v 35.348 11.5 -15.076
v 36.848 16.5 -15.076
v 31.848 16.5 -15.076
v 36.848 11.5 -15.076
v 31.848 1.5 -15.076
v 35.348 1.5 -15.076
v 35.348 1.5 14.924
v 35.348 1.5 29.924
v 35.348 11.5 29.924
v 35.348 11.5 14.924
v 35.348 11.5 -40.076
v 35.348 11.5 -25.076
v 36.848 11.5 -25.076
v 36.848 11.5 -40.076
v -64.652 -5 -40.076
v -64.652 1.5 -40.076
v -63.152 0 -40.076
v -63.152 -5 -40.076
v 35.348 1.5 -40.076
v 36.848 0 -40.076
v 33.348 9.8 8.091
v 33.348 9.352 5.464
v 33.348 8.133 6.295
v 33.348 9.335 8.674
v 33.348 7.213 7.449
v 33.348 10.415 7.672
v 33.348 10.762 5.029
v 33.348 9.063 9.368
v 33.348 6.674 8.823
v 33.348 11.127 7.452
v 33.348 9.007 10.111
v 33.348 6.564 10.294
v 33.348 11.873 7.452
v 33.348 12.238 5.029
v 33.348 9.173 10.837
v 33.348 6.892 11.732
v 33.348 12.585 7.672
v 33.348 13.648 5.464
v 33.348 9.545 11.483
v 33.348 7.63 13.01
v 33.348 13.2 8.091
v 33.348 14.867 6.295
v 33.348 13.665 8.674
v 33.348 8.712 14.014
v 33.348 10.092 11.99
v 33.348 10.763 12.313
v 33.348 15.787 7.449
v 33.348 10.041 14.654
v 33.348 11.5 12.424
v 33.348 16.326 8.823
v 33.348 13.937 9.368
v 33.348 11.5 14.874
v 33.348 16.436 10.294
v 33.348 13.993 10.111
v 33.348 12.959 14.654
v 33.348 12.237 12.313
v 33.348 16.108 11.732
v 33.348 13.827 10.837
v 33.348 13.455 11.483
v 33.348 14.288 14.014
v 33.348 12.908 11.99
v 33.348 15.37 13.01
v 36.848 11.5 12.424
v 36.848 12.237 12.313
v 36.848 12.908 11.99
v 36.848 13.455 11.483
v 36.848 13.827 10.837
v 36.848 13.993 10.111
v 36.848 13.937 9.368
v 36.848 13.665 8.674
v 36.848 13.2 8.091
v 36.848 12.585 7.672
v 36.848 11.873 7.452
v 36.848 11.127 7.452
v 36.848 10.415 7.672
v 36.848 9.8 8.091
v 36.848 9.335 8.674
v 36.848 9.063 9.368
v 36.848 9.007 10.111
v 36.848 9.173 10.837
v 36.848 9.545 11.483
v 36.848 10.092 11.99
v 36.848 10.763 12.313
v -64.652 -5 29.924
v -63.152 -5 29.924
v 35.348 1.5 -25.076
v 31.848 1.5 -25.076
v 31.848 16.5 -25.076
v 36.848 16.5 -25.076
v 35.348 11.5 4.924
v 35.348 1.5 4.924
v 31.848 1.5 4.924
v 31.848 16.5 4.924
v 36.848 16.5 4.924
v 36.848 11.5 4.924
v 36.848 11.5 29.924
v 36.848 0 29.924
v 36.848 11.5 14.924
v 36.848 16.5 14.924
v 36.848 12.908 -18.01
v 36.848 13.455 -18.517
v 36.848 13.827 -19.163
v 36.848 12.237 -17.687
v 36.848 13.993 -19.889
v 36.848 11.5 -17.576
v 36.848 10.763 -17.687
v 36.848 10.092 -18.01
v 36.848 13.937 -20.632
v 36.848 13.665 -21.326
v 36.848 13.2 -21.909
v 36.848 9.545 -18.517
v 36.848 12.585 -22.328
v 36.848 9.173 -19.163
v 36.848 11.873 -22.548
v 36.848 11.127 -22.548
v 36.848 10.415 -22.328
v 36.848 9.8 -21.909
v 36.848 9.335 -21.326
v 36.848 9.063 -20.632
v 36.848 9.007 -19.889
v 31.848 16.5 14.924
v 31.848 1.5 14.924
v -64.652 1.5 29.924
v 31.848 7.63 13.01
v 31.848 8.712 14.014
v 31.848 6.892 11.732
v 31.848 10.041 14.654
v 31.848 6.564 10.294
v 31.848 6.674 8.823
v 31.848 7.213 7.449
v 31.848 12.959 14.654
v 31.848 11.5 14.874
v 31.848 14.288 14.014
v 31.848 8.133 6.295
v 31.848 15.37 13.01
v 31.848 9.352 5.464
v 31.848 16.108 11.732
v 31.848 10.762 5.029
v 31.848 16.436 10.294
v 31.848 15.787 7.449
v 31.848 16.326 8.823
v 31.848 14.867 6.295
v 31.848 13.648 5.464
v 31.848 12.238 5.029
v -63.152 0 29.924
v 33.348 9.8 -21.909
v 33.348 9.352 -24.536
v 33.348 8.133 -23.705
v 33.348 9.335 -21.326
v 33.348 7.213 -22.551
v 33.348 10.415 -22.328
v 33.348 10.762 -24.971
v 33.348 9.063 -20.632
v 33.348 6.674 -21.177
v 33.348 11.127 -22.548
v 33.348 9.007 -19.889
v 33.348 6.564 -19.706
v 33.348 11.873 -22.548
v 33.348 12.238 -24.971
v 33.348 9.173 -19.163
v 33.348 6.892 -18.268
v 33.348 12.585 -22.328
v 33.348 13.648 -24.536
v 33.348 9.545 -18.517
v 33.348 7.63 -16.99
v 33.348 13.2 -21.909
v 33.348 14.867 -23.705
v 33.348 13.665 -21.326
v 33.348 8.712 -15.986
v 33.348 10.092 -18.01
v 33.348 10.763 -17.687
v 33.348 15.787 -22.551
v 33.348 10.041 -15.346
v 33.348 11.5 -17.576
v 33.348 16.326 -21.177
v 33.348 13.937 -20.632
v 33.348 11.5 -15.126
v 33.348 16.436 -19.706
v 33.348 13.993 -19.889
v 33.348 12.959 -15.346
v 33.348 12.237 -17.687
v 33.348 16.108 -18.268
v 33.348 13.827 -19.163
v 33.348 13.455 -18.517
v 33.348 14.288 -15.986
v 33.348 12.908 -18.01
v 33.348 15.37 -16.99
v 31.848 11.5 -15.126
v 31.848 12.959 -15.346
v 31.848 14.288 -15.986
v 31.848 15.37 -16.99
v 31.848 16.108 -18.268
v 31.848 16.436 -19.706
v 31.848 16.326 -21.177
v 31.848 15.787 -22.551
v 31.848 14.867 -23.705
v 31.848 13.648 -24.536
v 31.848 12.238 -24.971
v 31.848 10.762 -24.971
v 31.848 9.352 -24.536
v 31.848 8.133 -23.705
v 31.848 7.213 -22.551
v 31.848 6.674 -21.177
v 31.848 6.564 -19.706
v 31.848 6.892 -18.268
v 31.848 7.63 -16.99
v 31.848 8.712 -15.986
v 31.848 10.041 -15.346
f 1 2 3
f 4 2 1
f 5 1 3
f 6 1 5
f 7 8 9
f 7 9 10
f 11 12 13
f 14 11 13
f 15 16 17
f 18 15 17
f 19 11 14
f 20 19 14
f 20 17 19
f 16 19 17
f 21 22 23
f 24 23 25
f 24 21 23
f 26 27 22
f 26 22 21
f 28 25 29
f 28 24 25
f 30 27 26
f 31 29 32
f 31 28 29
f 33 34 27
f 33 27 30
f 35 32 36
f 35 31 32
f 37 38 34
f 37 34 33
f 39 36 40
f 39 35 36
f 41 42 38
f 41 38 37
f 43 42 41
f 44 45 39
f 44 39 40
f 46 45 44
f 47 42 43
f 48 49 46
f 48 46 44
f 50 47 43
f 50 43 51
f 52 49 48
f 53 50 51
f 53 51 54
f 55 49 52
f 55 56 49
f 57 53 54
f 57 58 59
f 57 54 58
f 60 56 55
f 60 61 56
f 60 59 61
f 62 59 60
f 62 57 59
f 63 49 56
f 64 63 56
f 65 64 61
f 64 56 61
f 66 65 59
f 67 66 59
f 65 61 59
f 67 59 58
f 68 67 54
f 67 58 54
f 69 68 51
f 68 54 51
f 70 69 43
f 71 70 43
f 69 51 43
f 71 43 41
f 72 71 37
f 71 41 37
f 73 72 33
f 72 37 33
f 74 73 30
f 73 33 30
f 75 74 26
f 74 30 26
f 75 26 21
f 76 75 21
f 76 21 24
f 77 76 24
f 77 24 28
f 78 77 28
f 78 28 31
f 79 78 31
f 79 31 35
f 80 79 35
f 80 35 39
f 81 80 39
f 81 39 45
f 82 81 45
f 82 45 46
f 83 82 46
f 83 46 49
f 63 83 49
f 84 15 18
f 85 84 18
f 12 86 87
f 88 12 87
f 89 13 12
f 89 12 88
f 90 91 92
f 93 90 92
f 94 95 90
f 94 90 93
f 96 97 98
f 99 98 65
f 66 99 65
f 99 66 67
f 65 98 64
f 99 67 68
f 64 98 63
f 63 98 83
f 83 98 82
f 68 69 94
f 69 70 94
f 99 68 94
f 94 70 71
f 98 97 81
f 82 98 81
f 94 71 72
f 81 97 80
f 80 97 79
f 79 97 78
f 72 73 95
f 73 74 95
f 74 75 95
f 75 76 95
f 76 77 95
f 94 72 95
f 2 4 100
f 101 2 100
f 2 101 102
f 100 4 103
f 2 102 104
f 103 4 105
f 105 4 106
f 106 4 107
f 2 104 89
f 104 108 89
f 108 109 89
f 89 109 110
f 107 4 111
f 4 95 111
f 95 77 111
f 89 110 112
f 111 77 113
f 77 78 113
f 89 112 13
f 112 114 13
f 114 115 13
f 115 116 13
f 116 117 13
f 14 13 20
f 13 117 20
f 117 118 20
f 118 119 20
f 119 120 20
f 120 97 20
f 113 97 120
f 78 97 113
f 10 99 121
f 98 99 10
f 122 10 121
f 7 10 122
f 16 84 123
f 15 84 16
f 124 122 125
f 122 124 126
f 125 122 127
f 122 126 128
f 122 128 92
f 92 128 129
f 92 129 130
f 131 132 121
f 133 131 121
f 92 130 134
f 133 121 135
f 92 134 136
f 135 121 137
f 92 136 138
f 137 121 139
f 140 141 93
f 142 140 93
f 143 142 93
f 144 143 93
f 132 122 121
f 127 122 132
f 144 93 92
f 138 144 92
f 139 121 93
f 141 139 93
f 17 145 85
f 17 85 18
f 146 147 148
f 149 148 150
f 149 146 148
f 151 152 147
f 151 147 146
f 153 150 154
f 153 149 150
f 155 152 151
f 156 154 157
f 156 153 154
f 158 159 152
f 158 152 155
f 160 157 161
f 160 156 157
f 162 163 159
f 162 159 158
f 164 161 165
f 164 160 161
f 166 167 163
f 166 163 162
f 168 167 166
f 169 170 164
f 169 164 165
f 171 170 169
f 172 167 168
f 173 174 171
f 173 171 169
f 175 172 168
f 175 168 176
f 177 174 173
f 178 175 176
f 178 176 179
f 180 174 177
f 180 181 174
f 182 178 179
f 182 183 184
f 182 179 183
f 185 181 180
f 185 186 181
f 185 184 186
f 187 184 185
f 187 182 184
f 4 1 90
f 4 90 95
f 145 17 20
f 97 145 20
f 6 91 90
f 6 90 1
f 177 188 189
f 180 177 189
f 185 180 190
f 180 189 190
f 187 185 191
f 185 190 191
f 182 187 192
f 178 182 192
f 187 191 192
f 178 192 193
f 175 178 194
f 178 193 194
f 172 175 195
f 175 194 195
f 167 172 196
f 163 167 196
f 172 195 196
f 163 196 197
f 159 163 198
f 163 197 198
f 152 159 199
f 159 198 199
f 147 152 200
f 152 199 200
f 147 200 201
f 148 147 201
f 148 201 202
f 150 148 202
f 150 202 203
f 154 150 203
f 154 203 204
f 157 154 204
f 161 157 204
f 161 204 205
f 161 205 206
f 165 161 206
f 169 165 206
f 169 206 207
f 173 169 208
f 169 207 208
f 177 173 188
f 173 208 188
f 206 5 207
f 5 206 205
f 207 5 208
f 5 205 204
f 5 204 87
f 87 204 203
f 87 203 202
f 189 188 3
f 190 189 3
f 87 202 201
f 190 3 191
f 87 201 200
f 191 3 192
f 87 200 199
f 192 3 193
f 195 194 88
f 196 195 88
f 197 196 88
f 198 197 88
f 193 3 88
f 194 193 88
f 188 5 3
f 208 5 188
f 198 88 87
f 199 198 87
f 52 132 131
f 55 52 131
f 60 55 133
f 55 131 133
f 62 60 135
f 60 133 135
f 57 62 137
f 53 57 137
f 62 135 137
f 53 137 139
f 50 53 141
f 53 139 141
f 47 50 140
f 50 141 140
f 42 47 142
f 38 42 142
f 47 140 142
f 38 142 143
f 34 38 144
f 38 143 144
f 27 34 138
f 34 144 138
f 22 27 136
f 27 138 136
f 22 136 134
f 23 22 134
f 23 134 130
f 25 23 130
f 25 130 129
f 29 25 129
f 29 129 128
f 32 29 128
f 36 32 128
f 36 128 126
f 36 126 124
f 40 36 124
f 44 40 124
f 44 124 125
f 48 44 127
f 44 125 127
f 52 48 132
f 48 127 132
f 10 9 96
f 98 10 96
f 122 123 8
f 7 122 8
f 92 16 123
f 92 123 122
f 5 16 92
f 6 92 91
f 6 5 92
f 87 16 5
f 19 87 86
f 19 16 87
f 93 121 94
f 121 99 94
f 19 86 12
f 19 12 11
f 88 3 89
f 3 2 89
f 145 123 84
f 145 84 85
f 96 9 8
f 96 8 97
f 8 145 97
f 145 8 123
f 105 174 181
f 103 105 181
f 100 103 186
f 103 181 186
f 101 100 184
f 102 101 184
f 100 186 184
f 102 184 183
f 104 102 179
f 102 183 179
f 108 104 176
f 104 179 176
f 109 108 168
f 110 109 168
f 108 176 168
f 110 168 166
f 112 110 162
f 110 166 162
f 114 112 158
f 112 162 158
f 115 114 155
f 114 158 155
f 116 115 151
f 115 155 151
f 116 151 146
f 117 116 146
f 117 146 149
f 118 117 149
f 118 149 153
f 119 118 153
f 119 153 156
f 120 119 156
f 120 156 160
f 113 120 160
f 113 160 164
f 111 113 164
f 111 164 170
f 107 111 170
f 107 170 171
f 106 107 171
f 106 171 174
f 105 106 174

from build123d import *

# Parameters (mm, degrees)
SKETCH1_W           = 1.5
SKETCH1_H           = 70
BOSS_EXTRUDE1_DEPTH = 5
SKETCH1_3_W         = 101.5
SKETCH1_3_H         = 70
BOSS_EXTRUDE2_DEPTH = 1.5
BOSS_EXTRUDE3_START = 1.5
SKETCH1_4_W         = 1.5
SKETCH1_4_H         = 70
BOSS_EXTRUDE3_DEPTH = 10
SKETCH2_W           = 10
SKETCH2_H           = 5
BOSS_EXTRUDE4_DEPTH = 1.5
BOSS_EXTRUDE5_START = -1.5
SKETCH2_4_W         = 10
SKETCH2_4_H         = 5
BOSS_EXTRUDE5_DEPTH = 3.5
SKETCH4_R           = 4.95
SKETCH4_R_2         = 2.5
CUT_EXTRUDE1_DEPTH  = 1.5
SKETCH4_2_R         = 2.5
CUT_EXTRUDE2_DEPTH  = 106.785569976


with BuildPart() as part:
    # Sketch1 → Boss-Extrude1 (new body)
    with BuildSketch(Plane(origin=(0, 0, 0), x_dir=(1, 0, 0), z_dir=(0, 1, 0))):
        with Locations((-63.901879758, 5.076012966)):
            Rectangle(SKETCH1_W, SKETCH1_H)
    extrude(amount=-BOSS_EXTRUDE1_DEPTH)

    # Sketch1<3> → Boss-Extrude2 (add)
    with BuildSketch(Plane(origin=(0, 0, 0), x_dir=(1, 0, 0), z_dir=(0, 1, 0))):
        with Locations((-13.901879758, 5.076012966)):
            Rectangle(SKETCH1_3_W, SKETCH1_3_H)
    extrude(amount=BOSS_EXTRUDE2_DEPTH)

    # Sketch1<4> → Boss-Extrude3 (add)
    with BuildSketch(Plane(origin=(0, 0, 0), x_dir=(1, 0, 0), z_dir=(0, 1, 0)).offset(BOSS_EXTRUDE3_START)):
        with Locations((36.098120242, 5.076012966)):
            Rectangle(SKETCH1_4_W, SKETCH1_4_H)
    extrude(amount=BOSS_EXTRUDE3_DEPTH)

    # Sketch2 → Boss-Extrude4 (add)
    with BuildSketch(Plane(origin=(36.848120242, 0, 0), x_dir=(0, 0, -1), z_dir=(1, 0, 0))):
        with Locations((-9.923987034, 14)):
            Rectangle(SKETCH2_W, SKETCH2_H)
        with Locations((20.076012966, 14)):
            Rectangle(SKETCH2_W, SKETCH2_H)
    extrude(amount=-BOSS_EXTRUDE4_DEPTH)

    # Sketch2<4> → Boss-Extrude5 (add)
    with BuildSketch(Plane(origin=(36.848120242, 0, 0), x_dir=(0, 0, -1), z_dir=(1, 0, 0)).offset(BOSS_EXTRUDE5_START)):
        with Locations((-9.923987034, 14)):
            Rectangle(SKETCH2_4_W, SKETCH2_4_H)
        with Locations((-9.923987034, 9)):
            Rectangle(SKETCH2_4_W, SKETCH2_4_H)
        with Locations((20.076012966, 9)):
            Rectangle(SKETCH2_4_W, SKETCH2_4_H)
        with Locations((20.076012966, 14)):
            Rectangle(SKETCH2_4_W, SKETCH2_4_H)
        with Locations((-9.923987034, 4)):
            Rectangle(SKETCH2_4_W, SKETCH2_4_H)
        with Locations((20.076012966, 4)):
            Rectangle(SKETCH2_4_W, SKETCH2_4_H)
    extrude(amount=-BOSS_EXTRUDE5_DEPTH)

    # Sketch4 → Cut-Extrude1 (cut)
    # profile 1 of 2: a face of its own
    with BuildSketch(Plane.ZY.offset(-31.848120242)):
        with Locations((-20.076012966, 11.5)):
            Circle(SKETCH4_R)
        with Locations((-20.076012966, 11.5)):
            Circle(SKETCH4_R_2, mode=Mode.SUBTRACT)
    # profile 2 of 2: a face of its own
    with BuildSketch(Plane.ZY.offset(-31.848120242)):
        with Locations((9.923987034, 11.5)):
            Circle(SKETCH4_R)
        with Locations((9.923987034, 11.5)):
            Circle(SKETCH4_R_2, mode=Mode.SUBTRACT)
    extrude(amount=-CUT_EXTRUDE1_DEPTH, mode=Mode.SUBTRACT)

    # Sketch4<2> → Cut-Extrude2 (cut, through all)
    with BuildSketch(Plane.ZY.offset(-31.848120242)):
        with Locations((-20.076012966, 11.5)):
            Circle(SKETCH4_2_R)
        with Locations((9.923987034, 11.5)):
            Circle(SKETCH4_2_R)
    extrude(amount=-CUT_EXTRUDE2_DEPTH, mode=Mode.SUBTRACT)


solid = part.part
